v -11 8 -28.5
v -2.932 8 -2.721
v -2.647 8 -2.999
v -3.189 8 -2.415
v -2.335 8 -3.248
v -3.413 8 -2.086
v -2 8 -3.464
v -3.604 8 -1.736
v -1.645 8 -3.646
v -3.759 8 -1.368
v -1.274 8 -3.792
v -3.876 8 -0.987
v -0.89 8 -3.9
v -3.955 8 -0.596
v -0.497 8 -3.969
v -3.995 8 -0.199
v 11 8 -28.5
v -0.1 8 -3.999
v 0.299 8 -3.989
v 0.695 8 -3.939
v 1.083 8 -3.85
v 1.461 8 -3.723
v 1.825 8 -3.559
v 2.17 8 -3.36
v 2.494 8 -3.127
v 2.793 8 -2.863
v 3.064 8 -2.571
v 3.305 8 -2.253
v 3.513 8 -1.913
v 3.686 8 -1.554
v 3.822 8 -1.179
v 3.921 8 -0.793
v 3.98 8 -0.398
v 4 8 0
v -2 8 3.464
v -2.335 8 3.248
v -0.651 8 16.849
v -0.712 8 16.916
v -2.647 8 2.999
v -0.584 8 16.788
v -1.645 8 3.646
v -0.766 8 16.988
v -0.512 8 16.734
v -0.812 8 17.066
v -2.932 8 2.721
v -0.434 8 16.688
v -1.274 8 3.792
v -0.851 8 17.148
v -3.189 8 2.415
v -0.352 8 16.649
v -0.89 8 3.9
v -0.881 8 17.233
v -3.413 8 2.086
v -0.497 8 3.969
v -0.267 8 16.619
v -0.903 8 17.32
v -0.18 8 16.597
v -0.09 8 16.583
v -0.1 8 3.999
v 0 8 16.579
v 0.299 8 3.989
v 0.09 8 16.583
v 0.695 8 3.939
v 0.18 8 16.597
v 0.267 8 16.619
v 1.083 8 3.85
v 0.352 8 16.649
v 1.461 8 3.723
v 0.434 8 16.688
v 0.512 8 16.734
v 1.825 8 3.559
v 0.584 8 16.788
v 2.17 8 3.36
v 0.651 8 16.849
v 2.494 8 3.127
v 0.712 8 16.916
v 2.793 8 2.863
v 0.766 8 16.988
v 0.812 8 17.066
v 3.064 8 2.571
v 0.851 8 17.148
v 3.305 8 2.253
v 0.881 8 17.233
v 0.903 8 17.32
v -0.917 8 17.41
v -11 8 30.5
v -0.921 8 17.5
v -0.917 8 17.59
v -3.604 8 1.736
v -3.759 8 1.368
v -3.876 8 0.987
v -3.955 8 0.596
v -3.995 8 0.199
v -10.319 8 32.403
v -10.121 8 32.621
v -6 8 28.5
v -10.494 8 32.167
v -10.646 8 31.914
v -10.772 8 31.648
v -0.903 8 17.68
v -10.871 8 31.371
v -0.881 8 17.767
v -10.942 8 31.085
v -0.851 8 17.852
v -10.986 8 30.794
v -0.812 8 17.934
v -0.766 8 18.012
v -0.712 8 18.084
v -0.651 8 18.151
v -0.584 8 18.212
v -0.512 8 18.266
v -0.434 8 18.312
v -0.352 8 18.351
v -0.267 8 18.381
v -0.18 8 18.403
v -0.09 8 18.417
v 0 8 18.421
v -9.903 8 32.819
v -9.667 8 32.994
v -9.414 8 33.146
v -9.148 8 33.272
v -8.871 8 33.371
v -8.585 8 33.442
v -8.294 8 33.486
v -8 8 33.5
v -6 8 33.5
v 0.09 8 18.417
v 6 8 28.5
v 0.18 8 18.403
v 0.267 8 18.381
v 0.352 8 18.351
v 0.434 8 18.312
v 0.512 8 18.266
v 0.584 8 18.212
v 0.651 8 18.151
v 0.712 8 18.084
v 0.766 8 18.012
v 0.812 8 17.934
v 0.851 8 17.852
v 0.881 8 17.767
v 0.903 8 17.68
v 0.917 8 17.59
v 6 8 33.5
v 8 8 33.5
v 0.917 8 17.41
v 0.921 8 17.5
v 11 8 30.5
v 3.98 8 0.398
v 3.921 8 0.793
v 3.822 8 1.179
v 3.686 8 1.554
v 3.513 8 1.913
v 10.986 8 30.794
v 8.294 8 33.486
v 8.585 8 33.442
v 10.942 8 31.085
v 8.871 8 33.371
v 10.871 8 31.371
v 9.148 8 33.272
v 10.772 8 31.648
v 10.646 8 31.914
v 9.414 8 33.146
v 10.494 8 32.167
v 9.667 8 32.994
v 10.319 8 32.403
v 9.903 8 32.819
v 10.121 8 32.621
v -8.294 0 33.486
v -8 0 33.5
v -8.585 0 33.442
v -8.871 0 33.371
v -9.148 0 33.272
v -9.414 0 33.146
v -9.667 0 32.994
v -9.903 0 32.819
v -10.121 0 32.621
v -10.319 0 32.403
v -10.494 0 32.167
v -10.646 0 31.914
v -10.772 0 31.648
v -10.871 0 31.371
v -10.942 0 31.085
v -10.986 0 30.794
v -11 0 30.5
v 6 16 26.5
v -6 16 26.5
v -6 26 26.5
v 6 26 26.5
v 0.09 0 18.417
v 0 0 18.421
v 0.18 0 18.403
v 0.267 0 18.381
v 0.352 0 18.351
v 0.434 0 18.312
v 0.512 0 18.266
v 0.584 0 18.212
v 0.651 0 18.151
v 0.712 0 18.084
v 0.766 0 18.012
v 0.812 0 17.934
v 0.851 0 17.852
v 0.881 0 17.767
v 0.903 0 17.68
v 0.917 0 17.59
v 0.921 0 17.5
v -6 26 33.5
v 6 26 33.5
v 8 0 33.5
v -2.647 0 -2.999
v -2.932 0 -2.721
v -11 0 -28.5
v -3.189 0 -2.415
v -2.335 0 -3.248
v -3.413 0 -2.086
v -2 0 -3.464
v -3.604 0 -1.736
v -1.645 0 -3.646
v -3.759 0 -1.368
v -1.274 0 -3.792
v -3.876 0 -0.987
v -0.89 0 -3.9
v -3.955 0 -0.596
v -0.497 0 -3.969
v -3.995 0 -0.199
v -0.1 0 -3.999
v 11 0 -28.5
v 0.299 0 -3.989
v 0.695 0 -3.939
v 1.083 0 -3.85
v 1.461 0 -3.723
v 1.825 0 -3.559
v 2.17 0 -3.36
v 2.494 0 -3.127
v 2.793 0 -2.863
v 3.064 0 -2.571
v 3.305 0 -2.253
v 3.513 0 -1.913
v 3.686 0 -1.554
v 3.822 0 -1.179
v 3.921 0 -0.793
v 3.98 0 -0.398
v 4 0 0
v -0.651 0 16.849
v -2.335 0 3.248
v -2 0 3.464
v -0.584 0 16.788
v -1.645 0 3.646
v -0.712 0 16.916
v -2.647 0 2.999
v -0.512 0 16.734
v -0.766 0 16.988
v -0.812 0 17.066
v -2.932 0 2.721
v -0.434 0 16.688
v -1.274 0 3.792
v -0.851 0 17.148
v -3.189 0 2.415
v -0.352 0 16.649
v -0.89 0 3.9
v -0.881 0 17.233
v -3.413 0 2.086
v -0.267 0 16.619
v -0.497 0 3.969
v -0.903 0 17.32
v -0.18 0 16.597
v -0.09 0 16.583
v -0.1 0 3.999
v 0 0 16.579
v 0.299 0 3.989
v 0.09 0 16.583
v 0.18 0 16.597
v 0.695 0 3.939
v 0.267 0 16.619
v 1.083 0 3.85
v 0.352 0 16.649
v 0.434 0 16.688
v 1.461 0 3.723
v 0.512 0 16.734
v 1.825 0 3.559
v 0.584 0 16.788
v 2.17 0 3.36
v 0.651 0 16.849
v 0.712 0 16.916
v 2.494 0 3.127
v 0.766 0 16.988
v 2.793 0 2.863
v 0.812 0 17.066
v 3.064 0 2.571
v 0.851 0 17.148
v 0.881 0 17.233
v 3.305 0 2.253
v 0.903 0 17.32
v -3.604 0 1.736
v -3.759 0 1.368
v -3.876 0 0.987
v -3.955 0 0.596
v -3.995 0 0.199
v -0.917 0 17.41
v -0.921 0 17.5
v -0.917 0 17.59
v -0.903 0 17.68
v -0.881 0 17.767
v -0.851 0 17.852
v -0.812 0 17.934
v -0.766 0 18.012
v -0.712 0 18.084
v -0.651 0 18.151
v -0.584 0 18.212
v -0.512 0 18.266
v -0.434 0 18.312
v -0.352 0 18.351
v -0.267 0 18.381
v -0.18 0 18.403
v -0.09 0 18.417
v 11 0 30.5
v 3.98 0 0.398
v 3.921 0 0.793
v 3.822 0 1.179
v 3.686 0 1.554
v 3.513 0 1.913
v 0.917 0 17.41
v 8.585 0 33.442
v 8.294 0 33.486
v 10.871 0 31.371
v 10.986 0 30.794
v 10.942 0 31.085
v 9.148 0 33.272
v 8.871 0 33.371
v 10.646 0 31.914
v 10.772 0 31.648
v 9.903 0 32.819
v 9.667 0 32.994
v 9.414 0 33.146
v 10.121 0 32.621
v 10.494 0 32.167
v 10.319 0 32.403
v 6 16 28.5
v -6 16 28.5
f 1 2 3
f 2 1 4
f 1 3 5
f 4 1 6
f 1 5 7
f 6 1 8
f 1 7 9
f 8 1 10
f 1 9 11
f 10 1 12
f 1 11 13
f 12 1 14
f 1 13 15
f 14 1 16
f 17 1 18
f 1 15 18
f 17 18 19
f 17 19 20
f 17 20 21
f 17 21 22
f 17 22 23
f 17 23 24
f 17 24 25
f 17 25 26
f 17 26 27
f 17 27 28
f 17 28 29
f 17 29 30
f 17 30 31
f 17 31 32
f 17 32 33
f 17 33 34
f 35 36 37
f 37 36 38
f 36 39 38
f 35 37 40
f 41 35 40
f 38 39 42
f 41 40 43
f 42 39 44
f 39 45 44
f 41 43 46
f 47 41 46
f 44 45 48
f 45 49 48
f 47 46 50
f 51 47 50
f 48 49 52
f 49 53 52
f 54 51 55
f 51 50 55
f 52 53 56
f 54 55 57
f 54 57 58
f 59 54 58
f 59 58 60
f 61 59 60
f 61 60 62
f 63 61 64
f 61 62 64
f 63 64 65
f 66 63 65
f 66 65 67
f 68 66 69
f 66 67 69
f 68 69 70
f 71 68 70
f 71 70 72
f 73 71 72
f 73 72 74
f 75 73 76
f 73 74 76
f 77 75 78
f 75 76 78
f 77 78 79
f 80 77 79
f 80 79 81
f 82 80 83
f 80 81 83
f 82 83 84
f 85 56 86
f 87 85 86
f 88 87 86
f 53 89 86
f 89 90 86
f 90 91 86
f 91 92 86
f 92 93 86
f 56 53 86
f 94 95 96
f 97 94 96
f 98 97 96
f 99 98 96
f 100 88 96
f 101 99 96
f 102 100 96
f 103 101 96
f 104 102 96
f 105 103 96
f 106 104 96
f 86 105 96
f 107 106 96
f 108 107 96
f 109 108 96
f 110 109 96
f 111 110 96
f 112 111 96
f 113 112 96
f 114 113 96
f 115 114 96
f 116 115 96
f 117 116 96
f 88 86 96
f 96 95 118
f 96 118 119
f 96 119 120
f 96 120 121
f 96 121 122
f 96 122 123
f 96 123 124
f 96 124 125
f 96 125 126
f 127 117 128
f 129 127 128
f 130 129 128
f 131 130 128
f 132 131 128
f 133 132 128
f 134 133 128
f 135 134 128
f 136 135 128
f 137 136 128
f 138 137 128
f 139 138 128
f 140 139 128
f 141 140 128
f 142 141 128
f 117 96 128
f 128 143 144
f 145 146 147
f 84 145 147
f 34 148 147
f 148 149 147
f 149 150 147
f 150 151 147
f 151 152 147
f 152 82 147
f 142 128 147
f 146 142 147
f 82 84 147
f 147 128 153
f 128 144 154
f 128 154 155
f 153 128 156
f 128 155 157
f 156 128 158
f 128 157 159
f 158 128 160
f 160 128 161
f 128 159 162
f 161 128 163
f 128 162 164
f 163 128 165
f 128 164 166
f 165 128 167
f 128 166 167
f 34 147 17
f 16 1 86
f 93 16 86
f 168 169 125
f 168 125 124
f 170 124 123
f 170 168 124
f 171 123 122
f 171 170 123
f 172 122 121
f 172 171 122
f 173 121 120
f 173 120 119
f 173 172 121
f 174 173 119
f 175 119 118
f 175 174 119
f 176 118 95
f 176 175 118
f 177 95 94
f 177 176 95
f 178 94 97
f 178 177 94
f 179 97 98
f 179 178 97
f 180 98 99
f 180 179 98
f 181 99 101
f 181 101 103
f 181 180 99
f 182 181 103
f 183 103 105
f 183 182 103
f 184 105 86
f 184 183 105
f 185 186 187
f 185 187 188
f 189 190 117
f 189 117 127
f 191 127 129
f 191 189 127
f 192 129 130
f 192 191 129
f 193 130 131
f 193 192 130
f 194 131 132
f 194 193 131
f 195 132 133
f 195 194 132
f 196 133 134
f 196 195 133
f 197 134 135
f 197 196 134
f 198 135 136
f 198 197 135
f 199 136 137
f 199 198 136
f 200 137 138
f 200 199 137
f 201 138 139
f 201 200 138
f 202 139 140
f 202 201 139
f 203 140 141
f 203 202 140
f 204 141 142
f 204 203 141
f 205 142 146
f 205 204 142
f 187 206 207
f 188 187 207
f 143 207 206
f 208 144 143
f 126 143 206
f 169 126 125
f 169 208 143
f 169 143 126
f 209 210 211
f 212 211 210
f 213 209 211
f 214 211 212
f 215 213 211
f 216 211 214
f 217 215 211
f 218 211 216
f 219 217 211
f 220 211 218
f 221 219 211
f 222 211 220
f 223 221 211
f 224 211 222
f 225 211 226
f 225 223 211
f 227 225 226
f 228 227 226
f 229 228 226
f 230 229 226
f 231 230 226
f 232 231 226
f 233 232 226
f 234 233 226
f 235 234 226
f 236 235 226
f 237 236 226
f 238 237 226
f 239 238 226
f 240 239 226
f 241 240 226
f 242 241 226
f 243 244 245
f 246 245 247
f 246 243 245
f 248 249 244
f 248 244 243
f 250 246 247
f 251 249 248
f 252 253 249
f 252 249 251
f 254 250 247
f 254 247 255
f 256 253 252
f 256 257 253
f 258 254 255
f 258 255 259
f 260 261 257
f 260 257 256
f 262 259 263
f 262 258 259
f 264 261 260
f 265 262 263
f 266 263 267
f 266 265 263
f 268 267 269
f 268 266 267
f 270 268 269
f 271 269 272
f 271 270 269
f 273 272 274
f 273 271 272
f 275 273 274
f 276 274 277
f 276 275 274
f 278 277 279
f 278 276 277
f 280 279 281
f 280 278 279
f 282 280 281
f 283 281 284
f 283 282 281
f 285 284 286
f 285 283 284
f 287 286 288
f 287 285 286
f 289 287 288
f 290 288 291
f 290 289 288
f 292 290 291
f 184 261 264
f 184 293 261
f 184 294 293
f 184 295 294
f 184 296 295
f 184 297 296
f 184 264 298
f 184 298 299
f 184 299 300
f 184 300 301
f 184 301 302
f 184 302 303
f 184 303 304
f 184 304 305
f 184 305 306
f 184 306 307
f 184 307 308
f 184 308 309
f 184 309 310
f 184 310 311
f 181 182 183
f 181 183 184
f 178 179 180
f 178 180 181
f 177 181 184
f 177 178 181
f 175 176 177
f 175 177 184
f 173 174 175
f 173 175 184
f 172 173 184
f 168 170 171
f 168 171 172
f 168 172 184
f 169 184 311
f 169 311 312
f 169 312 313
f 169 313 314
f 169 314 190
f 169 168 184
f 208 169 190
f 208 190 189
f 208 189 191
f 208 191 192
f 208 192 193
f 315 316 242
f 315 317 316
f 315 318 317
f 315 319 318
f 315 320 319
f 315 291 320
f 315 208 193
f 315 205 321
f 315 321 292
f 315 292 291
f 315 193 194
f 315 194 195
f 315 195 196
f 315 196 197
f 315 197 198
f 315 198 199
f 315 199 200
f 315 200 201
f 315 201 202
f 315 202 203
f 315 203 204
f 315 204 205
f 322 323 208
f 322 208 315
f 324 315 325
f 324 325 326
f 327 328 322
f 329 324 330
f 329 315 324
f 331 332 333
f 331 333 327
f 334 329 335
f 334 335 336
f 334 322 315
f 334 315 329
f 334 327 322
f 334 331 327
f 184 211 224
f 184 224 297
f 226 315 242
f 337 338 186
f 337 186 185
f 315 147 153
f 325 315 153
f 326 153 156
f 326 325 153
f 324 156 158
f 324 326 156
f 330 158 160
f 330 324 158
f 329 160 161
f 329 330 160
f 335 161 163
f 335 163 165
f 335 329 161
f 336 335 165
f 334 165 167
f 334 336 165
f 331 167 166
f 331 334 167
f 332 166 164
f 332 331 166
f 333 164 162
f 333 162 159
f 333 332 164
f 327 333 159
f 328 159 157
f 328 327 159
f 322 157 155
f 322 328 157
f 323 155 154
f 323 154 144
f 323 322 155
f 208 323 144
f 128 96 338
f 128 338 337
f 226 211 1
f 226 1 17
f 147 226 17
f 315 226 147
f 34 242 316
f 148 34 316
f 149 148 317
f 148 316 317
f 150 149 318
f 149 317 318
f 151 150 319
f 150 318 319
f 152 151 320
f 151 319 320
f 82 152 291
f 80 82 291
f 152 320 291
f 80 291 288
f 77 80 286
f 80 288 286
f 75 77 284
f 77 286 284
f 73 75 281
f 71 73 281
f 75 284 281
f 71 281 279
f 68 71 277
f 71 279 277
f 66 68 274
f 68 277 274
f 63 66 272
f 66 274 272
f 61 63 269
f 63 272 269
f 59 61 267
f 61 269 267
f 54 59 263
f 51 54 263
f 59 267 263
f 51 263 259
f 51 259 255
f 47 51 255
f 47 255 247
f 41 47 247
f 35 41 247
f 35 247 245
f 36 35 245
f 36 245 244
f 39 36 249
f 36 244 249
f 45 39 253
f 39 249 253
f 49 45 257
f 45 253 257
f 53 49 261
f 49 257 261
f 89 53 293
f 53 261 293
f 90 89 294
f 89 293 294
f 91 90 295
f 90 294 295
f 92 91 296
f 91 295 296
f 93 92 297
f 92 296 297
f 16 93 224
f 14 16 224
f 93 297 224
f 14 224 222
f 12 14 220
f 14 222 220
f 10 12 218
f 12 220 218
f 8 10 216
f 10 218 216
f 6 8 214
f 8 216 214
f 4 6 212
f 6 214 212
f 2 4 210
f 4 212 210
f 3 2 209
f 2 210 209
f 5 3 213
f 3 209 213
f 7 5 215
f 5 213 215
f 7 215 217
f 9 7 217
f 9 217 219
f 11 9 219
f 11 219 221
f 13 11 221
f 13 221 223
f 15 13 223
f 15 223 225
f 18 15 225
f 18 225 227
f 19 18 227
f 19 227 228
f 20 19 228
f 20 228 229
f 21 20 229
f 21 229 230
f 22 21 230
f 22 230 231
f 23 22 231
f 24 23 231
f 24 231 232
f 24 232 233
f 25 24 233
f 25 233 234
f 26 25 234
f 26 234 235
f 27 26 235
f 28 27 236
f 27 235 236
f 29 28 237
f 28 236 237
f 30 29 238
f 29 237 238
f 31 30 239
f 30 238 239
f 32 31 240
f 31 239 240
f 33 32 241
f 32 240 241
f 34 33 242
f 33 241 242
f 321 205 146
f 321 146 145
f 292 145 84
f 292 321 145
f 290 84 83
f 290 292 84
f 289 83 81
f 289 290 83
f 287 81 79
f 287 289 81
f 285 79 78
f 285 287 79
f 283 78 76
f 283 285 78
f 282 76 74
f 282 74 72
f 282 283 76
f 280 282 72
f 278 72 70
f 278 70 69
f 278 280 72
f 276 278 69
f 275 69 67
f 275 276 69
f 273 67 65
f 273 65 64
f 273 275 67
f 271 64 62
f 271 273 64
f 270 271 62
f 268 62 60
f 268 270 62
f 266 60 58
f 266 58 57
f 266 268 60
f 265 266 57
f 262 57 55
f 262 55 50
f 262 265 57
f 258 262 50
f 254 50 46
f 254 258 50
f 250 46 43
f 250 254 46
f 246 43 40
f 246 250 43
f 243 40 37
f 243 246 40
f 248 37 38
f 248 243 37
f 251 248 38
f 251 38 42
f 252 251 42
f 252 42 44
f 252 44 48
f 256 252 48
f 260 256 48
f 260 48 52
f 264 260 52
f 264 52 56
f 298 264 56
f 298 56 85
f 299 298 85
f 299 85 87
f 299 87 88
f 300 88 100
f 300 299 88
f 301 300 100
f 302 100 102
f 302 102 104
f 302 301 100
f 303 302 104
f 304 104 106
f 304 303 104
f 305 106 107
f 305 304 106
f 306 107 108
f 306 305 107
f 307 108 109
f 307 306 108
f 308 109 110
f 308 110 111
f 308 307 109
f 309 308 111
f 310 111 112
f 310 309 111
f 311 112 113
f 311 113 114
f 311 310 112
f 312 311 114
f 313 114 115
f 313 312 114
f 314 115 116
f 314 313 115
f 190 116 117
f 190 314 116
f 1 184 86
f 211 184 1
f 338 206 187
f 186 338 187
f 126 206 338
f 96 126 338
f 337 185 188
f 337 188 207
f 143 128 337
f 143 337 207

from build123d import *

# Parameters (mm, degrees)
F0_R     = 4
F1_DEPTH = 8
F2_DEPTH = 16
F3_START = -16
F3_DEPTH = 10


with BuildPart() as f1:
    # F0 (on Front) → F1 (new body)
    with BuildSketch(Plane.XZ):
        with BuildLine():
            Line((11, -17.5), (11, 17.5))
            Line((11, 17.5), (11, 30.5))
            ThreePointArc((11, 30.5), (10.1213203436, 32.6213203436), (8, 33.5))
            Line((8, 33.5), (6, 33.5))
            Line((6, 33.5), (6, 28.5))
            Line((6, 28.5), (6, 26.5))
            Line((6, 26.5), (-6, 26.5))
            Line((-6, 26.5), (-6, 28.5))
            Line((-6, 28.5), (-6, 33.5))
            Line((-6, 33.5), (-8, 33.5))
            ThreePointArc((-8, 33.5), (-10.1213203436, 32.6213203436), (-11, 30.5))
            Line((-11, 30.5), (-11, 28.5))
            Line((-11, 28.5), (-11, 17.5))
            Line((-11, 17.5), (-11, -17.5))
            Line((-11, -17.5), (-11, -28.5))
            Line((-11, -28.5), (0, -28.5))
            Line((0, -28.5), (11, -28.5))
            Line((11, -28.5), (11, -17.5))
        make_face()
        Circle(F0_R, mode=Mode.SUBTRACT)
        with BuildLine():
            ThreePointArc((0, 18.4210526316), (0.6512825616, 18.1512825616), (0.9210526316, 17.5))
            ThreePointArc((0.9210526316, 17.5), (-0.6512825616, 16.8487174384), (0, 18.4210526316))
        make_face(mode=Mode.SUBTRACT)
        Polygon((6, 26.5), (6, 28.5), (0, 28.5), (-6, 28.5), (-6, 26.5), align=None)
        Polygon((6, 28.5), (6, 33.5), (0, 33.5), (-6, 33.5), (-6, 28.5), (0, 28.5), align=None)
    extrude(amount=-F1_DEPTH)

    # F0 (on Front) → F2 (join)
    with BuildSketch(Plane.XZ):
        Polygon((6, 28.5), (6, 33.5), (0, 33.5), (-6, 33.5), (-6, 28.5), (0, 28.5), align=None)
    extrude(amount=-F2_DEPTH)

    # F0 (on Front) → F3 (join)
    with BuildSketch(Plane.XZ.offset(F3_START)):
        Polygon((6, 28.5), (6, 33.5), (0, 33.5), (-6, 33.5), (-6, 28.5), (0, 28.5), align=None)
        Polygon((6, 26.5), (6, 28.5), (0, 28.5), (-6, 28.5), (-6, 26.5), align=None)
    extrude(amount=-F3_DEPTH)


solid = f1.part
